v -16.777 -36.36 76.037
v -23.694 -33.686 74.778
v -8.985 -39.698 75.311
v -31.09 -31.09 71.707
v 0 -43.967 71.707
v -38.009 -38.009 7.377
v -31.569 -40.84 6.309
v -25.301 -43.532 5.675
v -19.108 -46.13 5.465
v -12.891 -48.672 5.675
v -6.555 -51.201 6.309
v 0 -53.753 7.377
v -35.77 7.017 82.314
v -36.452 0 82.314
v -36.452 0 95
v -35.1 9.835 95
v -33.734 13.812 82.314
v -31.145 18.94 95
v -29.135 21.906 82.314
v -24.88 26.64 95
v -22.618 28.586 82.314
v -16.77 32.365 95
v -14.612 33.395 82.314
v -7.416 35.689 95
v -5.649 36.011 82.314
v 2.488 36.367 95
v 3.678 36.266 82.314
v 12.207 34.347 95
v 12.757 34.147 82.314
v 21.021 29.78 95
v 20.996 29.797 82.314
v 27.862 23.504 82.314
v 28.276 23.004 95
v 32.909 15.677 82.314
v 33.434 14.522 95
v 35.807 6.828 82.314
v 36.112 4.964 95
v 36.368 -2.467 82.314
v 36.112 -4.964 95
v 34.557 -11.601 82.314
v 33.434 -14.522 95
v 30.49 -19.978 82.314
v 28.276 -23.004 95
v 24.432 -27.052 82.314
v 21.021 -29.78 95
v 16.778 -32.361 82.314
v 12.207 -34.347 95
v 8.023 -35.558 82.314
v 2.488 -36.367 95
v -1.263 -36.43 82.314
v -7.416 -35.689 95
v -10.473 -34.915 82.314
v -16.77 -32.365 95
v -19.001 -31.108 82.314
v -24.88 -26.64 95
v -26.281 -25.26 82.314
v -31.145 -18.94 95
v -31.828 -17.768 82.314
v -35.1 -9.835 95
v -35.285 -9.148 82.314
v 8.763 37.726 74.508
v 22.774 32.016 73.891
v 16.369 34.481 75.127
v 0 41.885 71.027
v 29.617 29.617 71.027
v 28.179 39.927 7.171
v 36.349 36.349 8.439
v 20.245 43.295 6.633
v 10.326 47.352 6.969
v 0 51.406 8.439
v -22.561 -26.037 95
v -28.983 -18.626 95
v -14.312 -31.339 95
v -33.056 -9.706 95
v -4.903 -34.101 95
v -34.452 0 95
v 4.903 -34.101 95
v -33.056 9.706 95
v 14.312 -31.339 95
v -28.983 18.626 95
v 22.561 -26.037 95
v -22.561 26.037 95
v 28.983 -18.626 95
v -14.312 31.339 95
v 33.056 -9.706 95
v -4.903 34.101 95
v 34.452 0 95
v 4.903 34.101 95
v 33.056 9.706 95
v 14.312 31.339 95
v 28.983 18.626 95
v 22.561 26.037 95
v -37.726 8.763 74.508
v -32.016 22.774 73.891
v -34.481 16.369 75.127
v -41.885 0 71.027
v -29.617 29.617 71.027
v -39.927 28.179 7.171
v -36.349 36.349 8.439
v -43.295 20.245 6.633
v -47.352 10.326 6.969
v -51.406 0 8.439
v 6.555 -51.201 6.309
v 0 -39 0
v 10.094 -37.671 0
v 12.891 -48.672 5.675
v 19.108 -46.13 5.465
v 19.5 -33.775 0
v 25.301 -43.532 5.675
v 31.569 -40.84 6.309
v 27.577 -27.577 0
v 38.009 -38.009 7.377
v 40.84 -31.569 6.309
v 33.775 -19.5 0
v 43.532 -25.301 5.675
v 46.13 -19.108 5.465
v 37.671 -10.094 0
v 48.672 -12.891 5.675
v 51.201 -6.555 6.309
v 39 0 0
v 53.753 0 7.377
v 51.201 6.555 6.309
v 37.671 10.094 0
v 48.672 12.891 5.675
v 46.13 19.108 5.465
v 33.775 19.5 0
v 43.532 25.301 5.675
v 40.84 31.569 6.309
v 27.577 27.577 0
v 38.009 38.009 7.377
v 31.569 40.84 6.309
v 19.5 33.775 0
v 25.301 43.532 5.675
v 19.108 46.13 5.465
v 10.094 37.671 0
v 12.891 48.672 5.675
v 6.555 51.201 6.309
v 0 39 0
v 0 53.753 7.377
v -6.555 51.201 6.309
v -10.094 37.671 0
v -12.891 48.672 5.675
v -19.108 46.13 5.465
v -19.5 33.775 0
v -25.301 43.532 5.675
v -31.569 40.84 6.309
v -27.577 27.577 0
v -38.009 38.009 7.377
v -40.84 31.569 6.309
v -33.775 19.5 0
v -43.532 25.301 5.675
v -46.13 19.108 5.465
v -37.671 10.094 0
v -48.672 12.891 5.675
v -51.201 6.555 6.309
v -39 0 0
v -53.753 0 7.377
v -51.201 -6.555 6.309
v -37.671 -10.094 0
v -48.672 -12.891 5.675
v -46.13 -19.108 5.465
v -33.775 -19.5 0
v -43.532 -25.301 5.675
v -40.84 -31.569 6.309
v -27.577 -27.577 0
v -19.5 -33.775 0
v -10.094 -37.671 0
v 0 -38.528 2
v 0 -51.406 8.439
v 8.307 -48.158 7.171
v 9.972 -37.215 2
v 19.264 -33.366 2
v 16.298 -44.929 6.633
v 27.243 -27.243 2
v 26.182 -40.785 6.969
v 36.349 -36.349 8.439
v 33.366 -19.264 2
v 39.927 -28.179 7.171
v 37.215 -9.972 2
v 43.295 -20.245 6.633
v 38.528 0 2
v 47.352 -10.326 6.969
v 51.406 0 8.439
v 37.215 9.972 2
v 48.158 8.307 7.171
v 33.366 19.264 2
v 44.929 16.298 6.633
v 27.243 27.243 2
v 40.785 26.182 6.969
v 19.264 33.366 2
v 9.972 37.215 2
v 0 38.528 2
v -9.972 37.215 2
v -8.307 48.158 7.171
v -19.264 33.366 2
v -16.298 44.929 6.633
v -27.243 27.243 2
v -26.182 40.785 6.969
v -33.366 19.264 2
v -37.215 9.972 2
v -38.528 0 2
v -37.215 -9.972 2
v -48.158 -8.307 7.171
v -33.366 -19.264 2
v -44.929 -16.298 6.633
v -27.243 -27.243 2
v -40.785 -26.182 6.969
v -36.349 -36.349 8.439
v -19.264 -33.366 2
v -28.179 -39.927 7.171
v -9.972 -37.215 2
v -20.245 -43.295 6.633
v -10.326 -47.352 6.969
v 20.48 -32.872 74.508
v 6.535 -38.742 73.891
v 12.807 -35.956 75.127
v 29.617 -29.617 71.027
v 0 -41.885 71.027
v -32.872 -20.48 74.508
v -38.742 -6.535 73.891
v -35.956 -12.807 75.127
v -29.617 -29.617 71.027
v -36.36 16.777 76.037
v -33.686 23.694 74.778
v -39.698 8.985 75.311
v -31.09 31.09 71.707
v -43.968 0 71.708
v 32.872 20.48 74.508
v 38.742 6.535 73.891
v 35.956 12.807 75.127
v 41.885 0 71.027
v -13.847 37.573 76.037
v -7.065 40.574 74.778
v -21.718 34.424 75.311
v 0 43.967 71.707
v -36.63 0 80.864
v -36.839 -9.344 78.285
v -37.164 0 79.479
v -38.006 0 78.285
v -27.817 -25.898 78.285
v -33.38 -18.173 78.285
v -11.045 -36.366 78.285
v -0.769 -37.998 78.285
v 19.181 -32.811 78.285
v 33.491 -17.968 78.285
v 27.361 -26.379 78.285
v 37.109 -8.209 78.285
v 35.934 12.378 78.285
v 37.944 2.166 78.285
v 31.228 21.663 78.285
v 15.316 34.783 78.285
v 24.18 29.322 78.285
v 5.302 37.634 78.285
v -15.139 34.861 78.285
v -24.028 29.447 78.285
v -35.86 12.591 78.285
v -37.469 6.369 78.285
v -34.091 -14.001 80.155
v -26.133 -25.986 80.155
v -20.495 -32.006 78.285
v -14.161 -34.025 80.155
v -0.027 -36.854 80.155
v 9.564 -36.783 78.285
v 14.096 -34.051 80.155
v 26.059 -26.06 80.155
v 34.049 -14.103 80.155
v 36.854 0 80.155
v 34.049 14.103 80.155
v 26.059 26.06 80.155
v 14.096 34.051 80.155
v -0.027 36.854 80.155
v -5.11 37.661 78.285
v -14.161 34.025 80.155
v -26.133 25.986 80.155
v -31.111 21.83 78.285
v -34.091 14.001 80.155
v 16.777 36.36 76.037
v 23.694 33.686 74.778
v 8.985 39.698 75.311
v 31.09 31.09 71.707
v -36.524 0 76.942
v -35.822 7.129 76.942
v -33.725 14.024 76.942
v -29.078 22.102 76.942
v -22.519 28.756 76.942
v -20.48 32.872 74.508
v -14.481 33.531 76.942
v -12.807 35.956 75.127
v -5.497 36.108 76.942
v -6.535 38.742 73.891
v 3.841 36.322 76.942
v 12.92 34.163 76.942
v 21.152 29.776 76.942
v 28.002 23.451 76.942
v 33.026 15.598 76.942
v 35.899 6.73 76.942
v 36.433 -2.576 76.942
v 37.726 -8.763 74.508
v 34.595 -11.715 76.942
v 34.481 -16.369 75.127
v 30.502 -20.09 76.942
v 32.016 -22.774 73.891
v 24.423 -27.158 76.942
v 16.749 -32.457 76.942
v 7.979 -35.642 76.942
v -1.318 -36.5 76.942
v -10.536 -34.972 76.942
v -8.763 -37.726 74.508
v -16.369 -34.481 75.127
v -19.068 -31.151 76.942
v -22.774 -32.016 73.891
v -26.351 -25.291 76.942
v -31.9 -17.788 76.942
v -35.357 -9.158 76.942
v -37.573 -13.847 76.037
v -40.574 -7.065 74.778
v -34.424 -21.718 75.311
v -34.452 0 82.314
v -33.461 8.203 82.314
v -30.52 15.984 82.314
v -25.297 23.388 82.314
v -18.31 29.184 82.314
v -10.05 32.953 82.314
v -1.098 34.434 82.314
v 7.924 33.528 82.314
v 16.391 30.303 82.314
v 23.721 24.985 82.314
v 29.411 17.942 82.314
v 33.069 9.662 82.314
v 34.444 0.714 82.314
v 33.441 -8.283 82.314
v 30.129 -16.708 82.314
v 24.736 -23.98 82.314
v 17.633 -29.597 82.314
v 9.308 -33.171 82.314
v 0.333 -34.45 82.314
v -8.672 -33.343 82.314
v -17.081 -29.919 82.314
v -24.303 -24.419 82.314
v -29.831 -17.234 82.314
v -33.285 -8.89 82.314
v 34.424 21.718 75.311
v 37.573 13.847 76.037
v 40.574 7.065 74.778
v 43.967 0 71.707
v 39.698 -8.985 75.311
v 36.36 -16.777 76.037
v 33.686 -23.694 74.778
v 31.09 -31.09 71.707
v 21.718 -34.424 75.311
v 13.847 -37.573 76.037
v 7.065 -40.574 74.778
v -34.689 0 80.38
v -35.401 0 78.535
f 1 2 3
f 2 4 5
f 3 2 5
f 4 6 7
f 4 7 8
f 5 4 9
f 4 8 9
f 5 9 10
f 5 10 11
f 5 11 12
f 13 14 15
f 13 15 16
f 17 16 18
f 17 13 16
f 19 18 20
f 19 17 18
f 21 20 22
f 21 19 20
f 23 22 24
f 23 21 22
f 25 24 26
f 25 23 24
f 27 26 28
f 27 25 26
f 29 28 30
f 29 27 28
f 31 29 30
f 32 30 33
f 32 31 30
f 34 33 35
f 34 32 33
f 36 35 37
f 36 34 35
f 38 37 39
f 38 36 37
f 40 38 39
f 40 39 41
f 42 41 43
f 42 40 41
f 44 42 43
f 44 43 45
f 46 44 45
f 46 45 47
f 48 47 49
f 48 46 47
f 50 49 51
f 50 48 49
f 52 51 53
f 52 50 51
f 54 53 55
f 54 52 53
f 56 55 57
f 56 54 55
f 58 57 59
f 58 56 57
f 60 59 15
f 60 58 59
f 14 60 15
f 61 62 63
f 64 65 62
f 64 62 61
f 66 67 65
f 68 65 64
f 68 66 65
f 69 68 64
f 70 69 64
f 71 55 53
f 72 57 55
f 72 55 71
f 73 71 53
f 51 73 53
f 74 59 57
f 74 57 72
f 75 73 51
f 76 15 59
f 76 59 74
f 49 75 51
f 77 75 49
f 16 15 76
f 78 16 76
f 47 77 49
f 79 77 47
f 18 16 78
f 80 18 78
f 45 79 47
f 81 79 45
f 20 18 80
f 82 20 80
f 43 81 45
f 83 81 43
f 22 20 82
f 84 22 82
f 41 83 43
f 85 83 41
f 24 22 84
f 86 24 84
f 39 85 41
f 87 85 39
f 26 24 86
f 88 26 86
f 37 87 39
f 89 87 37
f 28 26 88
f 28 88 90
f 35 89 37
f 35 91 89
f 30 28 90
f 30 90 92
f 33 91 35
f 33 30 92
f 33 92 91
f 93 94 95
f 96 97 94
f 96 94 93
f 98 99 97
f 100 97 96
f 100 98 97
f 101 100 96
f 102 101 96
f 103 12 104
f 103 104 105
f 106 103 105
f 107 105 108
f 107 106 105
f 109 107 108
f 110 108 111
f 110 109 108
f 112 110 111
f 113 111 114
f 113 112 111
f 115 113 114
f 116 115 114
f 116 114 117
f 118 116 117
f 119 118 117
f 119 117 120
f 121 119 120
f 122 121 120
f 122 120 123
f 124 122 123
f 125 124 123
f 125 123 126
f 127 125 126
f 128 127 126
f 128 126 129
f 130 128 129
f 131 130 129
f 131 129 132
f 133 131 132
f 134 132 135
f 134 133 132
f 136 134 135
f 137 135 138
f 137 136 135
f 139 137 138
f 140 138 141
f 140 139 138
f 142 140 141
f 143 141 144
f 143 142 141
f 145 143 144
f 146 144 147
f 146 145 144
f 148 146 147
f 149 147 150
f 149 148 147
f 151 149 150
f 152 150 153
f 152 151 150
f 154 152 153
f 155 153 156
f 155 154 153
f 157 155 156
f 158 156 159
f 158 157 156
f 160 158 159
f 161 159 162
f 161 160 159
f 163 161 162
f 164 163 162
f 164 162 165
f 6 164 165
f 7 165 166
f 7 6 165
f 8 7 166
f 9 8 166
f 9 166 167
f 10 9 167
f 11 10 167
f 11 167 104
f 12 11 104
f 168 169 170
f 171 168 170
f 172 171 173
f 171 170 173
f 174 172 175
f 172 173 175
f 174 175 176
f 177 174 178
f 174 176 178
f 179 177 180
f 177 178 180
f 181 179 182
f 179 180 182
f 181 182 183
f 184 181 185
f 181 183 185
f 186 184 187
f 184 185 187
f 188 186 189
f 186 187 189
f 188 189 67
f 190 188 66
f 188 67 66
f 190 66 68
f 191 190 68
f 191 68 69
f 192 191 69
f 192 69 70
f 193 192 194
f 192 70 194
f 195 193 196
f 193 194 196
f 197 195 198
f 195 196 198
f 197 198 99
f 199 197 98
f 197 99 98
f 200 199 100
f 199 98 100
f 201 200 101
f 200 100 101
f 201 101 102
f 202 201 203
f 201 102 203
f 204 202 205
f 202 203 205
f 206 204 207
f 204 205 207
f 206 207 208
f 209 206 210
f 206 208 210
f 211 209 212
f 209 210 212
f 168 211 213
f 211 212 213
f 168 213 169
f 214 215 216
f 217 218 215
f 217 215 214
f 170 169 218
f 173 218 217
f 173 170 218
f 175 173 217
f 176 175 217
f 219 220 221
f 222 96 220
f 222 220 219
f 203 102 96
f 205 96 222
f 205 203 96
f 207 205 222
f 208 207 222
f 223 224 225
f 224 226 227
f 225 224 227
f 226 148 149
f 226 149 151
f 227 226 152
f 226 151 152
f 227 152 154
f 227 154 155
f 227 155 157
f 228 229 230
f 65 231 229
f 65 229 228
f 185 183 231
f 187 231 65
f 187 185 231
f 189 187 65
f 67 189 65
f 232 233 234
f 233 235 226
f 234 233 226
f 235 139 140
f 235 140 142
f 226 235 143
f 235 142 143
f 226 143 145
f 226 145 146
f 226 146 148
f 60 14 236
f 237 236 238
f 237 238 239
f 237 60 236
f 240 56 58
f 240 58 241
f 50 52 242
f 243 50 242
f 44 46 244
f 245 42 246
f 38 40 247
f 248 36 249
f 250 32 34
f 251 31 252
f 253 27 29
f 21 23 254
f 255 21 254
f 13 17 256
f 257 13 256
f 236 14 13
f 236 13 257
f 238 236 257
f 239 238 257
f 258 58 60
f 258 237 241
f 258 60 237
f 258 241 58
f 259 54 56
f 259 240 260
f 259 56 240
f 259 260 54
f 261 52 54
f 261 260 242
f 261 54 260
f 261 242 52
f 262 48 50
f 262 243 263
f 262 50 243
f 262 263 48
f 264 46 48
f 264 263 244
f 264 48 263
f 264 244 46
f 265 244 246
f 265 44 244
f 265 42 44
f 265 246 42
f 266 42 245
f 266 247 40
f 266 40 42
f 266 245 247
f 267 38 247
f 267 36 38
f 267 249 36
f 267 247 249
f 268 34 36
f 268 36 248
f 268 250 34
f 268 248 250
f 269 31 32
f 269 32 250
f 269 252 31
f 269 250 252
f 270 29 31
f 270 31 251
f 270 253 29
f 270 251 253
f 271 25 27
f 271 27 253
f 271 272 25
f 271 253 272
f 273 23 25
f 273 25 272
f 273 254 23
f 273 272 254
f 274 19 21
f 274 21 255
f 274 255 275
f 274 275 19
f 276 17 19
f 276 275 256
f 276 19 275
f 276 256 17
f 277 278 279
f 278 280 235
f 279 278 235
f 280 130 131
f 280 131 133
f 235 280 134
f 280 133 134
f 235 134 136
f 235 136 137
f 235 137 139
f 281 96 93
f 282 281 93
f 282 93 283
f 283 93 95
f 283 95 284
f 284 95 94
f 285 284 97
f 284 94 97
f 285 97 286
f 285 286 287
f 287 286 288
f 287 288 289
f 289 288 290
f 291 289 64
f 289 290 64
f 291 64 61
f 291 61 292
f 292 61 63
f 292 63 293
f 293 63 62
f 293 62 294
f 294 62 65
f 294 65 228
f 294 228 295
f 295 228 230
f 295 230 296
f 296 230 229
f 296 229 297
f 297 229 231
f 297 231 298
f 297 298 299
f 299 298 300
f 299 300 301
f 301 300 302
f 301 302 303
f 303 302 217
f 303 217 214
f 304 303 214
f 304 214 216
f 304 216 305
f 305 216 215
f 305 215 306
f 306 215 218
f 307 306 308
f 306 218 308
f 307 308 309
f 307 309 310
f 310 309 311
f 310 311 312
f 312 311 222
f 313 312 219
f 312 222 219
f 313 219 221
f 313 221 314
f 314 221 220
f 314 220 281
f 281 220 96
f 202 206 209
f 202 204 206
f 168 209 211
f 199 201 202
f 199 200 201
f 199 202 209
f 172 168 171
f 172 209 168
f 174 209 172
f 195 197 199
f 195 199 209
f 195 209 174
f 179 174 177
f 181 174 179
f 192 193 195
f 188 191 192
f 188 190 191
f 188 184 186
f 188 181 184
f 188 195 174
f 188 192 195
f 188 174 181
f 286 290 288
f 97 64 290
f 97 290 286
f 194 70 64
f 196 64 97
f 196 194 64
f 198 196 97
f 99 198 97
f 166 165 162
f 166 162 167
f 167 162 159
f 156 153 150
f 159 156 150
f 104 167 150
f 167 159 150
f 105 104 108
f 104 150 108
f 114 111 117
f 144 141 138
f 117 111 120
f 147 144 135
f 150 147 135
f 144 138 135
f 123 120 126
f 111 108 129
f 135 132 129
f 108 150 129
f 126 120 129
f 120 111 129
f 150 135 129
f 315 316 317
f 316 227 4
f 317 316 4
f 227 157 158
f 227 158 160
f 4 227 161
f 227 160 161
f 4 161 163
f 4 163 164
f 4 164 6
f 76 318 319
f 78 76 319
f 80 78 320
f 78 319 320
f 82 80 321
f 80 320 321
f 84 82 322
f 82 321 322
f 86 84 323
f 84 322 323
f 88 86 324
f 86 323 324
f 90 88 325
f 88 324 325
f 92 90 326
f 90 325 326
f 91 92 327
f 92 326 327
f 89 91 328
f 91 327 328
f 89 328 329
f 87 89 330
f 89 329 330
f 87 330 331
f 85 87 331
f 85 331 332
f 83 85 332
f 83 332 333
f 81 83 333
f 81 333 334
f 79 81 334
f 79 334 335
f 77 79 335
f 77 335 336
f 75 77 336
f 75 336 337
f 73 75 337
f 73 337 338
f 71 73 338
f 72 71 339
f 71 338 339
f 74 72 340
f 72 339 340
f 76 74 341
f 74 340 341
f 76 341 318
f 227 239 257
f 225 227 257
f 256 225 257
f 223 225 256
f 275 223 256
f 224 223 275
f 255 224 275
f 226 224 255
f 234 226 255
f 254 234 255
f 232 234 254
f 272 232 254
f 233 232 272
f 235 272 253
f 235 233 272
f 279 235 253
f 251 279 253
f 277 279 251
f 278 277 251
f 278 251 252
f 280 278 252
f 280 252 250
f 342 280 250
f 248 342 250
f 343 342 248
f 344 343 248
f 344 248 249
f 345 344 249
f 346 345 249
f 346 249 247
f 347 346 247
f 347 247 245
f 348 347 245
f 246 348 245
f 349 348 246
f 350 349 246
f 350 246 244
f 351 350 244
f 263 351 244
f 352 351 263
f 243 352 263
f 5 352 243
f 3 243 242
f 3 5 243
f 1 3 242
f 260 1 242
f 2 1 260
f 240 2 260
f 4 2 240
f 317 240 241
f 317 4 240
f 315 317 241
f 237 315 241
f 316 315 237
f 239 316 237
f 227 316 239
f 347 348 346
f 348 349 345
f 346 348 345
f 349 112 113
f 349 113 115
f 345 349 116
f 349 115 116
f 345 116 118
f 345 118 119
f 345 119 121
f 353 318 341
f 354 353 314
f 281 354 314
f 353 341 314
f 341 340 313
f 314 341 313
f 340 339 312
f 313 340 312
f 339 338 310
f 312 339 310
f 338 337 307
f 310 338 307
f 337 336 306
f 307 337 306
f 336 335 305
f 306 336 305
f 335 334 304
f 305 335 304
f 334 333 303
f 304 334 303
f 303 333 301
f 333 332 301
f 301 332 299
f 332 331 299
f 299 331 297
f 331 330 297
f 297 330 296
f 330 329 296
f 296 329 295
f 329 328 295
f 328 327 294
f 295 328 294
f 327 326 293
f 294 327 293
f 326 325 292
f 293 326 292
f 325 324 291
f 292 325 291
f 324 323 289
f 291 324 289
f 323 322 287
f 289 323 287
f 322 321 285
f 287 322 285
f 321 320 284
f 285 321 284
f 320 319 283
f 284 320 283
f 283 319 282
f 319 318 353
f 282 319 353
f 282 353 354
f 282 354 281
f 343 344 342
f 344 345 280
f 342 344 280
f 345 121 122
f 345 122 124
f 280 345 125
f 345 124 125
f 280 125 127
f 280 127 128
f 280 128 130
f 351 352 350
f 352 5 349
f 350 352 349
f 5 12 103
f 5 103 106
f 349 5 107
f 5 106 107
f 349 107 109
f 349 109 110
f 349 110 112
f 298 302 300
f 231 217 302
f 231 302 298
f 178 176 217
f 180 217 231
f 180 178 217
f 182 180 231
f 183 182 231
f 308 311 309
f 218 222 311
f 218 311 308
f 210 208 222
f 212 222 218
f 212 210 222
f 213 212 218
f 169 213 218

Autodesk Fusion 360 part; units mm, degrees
sketch "Sketch1" plane through (0, 0, 0) normal (0, 0, 1) x (1, 0, 0) in component "boiler"
  line L0 (38.8029, -38.8029) -> (54.8756, 0)
  line L1 (54.8756, 0) -> (38.8029, 38.8029)
  line L2 (38.8029, 38.8029) -> (0, 54.8756)
  line L3 (0, 54.8756) -> (-38.8029, 38.8029)
  line L4 (-38.8029, 38.8029) -> (-54.8756, 0)
  line L5 (-54.8756, 0) -> (-38.8029, -38.8029)
  line L6 (-38.8029, -38.8029) -> (0, -54.8756)
  line L7 (0, -54.8756) -> (38.8029, -38.8029)
  line L8 (0, 0) -> (0, -54.8756) construction
  dimension "d1" = 42
extrude "Extrude1" add sketch "Sketch1" along normal blind 80 draft -8 in component "boiler"
sketch "Sketch2" plane through (-19.0257, -45.9321, 6.9872) normal (-0.379, -0.9149, 0.1392) x (0.9239, -0.3827, 0) in component "boiler"
  line L0 (16.3429, 73.7303) -> (-16.3429, 73.7303)
  line L1 (-16.3429, 73.7303) -> (-21, -7.0559)
  line L2 (-21, -7.0559) -> (21, -7.0559)
  line L3 (21, -7.0559) -> (16.3429, 73.7303)
sketch "Sketch3" plane through (19.0257, -45.9321, 6.9872) normal (0.379, -0.9149, 0.1392) x (0.9239, 0.3827, 0) in component "boiler"
  line L0 (16.3429, 73.7303) -> (-16.3429, 73.7303)
  line L1 (-16.3429, 73.7303) -> (-21, -7.0559)
  line L2 (-21, -7.0559) -> (21, -7.0559)
  line L3 (21, -7.0559) -> (16.3429, 73.7303)
sketch "Sketch1 (2)" plane through (0, 0, 0) normal (1, 0, 0) x (0, 1, 0)
sketch "Sketch5" plane through (0, 0, 0) normal (1, 0, 0) x (0, 1, 0) in component "boiler"
  line L0 (-65, 0) -> (-57, 9)
  line L1 (-57, 9) -> (-39, 0)
  line L2 (-39, 0) -> (-65, 0)
revolve "Revolve1" cut sketch "Sketch5" angle 360 about axis through (0, 0, 1.75) along (0, 0, 1) in component "boiler"
sketch "Sketch2 (2)" plane through (0, 0, 0) normal (0, 1, 0) x (1, 0, 0)
  line L0 (-53.7535, -7.3767) -> (-42.706, -80)
  line L1 (-30.1977, -80) -> (-42.706, -80)
  line L2 (-36.4519, -80) -> (-43.9675, -71.7075)
revolve "Revolve2" cut sketch "Sketch2 (2)" angle 360 about axis through (0, 0, 1.75) along (0, 0, 1) in component "boiler"
extrude "Extrude2" add 1 faces at (9.3758, -5.1542, 80) along direction (0, 0, 1) blind 15 in component "boiler"
fillet "Fillet1" radius 6 1 edges at (33.9851, 13.1816, 80) in component "boiler"
shell "Shell1" thickness 2 removed faces 1 at (9.3758, -5.1542, 95) in component "boiler"
component "boiler" placed x (1, 0, 0) y (0, 1, 0) z (0, 0, 1) at (0, 0, 0)
